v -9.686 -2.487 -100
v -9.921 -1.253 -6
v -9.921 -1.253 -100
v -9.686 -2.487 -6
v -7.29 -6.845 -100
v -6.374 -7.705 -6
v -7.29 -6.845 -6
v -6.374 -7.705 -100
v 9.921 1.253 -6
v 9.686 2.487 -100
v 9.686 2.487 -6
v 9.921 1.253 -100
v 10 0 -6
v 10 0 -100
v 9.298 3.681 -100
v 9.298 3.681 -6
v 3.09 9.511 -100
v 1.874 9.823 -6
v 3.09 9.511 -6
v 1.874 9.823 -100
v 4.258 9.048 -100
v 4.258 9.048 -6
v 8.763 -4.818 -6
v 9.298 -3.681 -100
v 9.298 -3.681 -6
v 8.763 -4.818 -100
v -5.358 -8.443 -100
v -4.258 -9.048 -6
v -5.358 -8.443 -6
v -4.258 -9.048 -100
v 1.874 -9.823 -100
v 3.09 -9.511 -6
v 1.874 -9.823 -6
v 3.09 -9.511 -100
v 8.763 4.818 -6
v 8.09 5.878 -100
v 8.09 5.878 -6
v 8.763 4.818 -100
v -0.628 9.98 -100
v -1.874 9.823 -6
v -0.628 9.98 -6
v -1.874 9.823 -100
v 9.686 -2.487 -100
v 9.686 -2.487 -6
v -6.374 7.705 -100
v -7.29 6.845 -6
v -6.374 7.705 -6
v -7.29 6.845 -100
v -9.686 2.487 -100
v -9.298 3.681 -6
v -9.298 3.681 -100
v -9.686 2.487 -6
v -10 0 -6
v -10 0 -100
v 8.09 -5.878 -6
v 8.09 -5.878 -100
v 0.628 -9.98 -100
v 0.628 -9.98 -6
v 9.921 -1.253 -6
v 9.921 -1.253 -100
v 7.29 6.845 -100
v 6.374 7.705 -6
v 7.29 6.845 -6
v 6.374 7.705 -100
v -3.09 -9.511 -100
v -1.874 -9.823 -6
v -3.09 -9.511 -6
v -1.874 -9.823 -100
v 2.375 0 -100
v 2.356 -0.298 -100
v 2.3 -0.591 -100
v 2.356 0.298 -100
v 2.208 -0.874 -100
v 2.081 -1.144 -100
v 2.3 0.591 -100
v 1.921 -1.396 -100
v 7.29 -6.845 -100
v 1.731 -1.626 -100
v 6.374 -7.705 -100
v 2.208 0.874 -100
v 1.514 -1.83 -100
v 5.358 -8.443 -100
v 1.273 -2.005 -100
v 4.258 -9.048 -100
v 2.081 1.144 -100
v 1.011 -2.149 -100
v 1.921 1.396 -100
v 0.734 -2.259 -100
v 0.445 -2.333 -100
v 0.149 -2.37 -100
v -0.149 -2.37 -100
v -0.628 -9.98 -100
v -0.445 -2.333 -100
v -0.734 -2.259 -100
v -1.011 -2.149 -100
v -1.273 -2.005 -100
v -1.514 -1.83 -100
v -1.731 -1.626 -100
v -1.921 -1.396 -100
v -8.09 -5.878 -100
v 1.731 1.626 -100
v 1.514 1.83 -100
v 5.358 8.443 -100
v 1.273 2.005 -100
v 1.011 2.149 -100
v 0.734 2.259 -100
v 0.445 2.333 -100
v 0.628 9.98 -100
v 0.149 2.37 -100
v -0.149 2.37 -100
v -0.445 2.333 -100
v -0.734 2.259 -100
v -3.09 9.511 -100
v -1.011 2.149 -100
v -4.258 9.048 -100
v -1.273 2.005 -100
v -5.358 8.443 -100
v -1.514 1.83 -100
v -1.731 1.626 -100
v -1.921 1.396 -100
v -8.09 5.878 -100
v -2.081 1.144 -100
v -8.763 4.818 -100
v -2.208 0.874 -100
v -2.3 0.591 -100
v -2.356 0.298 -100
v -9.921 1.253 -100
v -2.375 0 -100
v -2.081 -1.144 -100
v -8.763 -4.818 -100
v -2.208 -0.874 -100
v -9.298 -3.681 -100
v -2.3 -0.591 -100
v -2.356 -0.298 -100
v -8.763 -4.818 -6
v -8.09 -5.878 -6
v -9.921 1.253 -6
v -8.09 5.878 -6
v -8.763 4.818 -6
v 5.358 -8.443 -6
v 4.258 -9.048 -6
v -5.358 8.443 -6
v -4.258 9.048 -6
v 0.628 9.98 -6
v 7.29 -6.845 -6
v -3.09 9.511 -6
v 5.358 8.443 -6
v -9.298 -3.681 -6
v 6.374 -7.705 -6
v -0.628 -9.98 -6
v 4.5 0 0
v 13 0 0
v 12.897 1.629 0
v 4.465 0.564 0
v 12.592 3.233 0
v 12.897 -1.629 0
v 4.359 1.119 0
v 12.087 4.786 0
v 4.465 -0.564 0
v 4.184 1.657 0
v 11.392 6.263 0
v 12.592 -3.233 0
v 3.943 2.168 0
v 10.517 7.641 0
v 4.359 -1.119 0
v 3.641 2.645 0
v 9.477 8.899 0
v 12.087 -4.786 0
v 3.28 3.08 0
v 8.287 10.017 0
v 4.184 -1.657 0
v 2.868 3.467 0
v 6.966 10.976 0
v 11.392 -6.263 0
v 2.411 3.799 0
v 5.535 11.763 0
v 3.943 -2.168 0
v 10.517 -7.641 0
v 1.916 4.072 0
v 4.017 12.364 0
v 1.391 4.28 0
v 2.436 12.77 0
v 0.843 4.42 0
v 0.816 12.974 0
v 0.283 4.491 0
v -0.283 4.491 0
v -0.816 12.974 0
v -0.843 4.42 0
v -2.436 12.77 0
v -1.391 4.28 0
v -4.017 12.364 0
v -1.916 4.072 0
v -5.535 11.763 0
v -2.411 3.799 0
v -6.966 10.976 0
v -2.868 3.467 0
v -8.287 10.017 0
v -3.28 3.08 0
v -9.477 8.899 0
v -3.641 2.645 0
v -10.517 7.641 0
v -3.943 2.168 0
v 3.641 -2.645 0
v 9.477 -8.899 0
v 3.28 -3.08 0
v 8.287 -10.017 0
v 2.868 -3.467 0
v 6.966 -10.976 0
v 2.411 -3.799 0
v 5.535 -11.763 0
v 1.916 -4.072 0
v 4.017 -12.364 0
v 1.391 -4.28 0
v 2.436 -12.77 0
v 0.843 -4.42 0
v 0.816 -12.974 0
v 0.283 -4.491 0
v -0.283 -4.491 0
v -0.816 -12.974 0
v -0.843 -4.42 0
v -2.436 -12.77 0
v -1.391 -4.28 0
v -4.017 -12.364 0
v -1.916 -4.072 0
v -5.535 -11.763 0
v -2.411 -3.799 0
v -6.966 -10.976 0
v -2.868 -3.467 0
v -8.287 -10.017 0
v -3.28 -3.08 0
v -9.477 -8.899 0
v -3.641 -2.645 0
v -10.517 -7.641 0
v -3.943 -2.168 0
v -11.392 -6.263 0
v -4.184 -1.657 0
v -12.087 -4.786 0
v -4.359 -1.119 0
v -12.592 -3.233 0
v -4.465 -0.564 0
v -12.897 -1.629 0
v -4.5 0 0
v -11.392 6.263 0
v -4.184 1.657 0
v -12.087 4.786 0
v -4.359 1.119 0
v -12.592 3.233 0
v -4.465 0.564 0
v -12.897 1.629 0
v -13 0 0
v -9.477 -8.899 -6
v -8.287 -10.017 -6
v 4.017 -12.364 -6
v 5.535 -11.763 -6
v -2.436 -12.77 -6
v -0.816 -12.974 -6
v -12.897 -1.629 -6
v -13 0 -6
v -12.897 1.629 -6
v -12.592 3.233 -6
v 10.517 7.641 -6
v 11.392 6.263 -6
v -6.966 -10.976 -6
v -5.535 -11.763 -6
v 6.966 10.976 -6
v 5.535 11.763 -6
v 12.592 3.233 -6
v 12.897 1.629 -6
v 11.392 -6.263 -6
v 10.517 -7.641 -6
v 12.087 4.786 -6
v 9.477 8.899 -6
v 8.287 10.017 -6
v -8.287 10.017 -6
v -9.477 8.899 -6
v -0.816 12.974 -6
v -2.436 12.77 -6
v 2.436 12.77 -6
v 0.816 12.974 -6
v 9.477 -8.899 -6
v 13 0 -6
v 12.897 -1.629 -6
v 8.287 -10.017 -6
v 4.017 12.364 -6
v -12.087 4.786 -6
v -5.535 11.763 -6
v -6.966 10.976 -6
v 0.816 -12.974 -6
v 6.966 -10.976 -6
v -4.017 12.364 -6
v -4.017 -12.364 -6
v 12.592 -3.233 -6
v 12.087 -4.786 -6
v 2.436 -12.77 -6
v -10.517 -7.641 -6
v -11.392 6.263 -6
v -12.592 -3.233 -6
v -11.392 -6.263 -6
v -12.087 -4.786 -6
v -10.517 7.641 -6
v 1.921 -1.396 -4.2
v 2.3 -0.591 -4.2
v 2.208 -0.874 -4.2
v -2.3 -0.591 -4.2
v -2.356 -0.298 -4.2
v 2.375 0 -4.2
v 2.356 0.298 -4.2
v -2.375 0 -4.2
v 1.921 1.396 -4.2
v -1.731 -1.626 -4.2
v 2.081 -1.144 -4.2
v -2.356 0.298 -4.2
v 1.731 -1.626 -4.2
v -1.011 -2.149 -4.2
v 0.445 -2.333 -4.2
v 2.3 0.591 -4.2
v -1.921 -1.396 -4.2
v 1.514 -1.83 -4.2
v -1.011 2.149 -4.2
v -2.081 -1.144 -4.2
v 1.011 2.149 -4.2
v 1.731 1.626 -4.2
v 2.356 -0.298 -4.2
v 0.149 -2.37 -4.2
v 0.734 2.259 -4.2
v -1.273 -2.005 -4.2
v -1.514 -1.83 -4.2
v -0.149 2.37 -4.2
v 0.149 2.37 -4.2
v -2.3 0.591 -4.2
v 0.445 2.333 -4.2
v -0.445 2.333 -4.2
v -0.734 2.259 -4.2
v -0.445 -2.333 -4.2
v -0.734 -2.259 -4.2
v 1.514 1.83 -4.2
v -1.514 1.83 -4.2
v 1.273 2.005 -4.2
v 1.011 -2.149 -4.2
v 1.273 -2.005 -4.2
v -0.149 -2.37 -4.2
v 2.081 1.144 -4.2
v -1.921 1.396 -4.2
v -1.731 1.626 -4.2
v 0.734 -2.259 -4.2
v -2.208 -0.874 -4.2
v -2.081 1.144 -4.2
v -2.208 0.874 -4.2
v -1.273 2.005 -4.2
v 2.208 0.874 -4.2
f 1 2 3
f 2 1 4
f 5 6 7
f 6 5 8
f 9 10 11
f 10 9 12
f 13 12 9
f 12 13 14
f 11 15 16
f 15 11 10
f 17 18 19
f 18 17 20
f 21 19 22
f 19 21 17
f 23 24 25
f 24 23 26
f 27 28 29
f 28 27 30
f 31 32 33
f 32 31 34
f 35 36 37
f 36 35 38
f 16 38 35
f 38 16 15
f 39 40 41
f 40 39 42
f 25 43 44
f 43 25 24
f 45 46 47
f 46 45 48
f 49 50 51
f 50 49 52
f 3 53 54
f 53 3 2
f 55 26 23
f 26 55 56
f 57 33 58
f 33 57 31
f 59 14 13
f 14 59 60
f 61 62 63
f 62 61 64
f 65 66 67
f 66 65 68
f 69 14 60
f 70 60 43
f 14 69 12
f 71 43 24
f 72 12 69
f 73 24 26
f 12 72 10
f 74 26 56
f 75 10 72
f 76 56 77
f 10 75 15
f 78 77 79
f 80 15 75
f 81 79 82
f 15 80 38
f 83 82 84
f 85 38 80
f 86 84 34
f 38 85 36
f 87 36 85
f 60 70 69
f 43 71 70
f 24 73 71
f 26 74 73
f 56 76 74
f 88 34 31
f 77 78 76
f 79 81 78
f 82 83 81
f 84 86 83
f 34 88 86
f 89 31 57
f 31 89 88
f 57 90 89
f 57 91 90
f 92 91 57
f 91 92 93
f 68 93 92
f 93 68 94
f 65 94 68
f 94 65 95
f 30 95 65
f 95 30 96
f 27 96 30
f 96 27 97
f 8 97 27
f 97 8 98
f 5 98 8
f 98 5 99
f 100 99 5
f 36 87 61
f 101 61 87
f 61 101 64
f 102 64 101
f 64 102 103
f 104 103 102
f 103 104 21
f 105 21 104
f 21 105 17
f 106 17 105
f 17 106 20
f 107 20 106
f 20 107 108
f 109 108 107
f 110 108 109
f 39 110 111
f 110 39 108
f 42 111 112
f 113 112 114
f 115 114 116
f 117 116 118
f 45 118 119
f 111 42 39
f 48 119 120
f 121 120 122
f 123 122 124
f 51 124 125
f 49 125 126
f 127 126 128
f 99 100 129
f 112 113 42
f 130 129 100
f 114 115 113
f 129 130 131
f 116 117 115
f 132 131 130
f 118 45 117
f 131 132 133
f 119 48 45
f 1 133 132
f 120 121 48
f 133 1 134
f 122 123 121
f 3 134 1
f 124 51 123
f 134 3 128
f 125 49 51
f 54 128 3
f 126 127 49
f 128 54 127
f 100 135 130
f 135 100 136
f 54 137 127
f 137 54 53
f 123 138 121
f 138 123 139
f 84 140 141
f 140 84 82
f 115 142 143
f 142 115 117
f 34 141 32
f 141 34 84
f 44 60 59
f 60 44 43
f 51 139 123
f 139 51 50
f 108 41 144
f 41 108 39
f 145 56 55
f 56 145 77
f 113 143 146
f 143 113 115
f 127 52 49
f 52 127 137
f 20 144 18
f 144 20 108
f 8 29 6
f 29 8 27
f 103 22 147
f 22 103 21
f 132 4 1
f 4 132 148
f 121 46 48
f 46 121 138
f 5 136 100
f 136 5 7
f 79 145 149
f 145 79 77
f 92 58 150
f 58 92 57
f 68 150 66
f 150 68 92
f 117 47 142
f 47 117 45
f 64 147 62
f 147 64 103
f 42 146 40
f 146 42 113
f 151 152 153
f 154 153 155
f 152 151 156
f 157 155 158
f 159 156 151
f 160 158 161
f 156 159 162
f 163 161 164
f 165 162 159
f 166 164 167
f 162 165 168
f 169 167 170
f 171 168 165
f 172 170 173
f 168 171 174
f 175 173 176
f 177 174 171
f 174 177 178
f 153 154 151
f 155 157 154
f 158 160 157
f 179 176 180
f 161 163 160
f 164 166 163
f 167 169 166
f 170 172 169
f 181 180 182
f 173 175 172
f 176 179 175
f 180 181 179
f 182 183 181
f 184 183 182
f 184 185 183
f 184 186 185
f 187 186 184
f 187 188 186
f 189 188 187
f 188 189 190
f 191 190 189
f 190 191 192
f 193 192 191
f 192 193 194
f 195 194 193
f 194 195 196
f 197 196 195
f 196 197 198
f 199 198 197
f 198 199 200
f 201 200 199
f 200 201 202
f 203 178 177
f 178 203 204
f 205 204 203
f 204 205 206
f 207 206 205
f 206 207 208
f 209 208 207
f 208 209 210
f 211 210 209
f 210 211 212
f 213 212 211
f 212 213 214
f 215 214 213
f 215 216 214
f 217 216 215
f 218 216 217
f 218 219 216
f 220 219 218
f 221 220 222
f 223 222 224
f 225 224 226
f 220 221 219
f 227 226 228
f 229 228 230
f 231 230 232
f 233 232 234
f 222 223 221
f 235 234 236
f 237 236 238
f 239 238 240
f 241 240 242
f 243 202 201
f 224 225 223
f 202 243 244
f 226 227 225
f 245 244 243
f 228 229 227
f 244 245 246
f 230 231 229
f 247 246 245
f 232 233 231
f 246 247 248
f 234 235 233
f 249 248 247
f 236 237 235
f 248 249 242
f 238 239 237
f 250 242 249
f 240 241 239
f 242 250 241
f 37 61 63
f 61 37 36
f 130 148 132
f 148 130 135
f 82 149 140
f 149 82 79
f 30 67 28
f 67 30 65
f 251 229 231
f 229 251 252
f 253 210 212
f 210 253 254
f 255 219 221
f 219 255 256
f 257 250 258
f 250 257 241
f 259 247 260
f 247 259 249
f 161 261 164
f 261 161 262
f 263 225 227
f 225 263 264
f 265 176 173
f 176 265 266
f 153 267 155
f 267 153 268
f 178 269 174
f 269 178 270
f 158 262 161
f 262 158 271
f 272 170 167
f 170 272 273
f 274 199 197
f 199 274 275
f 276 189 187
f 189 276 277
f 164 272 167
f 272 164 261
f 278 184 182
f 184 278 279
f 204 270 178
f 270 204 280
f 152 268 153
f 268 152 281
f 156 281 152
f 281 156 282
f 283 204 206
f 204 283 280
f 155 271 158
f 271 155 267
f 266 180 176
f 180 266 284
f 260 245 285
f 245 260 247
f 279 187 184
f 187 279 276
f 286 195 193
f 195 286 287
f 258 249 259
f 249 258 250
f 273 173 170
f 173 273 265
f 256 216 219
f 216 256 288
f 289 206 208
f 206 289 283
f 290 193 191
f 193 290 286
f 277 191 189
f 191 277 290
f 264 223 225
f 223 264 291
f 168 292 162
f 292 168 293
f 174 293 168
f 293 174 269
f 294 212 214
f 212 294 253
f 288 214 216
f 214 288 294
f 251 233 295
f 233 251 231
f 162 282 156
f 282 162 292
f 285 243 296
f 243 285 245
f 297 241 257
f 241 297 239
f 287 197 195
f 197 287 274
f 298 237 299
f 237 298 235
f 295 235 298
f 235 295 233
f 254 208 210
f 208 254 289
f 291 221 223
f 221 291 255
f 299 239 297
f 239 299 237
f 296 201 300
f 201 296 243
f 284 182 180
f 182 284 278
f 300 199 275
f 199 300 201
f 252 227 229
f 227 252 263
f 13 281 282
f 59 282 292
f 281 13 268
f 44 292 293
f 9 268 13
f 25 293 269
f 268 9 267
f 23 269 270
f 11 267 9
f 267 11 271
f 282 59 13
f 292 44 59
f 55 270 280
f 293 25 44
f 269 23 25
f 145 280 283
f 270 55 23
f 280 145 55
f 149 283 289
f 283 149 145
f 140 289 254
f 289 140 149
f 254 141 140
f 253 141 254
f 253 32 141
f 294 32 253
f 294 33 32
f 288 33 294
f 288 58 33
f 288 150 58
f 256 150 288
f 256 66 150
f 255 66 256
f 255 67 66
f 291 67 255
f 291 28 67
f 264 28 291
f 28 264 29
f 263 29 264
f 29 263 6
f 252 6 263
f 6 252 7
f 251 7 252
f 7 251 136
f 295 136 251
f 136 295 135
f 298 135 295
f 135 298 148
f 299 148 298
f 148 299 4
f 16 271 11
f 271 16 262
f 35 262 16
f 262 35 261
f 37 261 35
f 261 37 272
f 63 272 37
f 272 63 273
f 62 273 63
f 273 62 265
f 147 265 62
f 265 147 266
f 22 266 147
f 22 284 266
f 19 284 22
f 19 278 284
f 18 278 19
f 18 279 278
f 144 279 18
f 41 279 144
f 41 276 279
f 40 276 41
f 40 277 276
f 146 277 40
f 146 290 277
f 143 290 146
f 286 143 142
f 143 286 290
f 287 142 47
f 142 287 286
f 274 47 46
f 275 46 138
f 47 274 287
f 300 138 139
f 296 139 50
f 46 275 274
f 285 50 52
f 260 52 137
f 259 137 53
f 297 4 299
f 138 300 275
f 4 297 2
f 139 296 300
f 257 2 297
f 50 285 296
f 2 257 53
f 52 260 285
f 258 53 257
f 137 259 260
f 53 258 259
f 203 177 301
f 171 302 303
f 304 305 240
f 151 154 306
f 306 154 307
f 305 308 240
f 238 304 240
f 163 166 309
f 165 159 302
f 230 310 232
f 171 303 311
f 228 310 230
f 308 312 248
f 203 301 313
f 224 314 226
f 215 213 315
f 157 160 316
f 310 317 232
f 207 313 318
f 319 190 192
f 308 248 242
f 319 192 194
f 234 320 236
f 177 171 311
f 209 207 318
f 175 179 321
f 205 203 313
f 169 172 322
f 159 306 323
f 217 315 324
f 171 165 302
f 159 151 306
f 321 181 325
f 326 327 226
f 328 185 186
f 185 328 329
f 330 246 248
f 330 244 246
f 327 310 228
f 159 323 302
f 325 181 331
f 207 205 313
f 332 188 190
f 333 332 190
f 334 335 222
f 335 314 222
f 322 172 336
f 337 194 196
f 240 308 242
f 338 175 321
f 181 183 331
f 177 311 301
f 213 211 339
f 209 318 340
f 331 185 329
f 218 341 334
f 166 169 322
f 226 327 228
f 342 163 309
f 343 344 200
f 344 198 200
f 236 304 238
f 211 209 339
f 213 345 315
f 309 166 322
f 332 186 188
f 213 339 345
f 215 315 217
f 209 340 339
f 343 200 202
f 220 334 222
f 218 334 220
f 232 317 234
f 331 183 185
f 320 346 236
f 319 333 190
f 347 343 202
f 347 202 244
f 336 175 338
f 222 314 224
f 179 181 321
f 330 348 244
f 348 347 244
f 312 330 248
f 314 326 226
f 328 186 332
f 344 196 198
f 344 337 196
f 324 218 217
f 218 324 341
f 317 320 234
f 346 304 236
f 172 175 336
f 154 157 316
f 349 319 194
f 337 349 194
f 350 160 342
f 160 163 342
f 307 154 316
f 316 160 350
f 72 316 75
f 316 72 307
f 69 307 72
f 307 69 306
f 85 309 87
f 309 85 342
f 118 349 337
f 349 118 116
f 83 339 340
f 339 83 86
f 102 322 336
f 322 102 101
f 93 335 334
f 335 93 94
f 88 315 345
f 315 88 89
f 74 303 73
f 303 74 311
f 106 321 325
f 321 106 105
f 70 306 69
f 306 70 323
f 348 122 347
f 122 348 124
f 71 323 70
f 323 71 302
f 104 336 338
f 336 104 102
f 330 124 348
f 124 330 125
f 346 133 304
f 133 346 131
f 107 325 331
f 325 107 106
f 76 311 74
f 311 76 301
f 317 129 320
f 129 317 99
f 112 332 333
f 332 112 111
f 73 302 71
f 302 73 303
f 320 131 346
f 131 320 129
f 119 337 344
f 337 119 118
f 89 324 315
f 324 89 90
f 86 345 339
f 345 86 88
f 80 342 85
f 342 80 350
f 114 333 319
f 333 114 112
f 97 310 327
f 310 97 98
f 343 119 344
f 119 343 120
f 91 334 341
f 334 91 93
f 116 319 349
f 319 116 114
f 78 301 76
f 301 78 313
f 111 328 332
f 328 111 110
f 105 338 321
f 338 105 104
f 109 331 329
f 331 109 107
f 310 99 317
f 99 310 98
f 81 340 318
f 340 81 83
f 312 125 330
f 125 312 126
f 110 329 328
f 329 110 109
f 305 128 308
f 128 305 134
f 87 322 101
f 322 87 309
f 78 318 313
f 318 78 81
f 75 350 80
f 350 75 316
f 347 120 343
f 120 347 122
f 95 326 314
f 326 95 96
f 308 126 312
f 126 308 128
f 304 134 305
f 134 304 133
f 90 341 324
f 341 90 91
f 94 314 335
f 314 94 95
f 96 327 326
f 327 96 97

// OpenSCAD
$fn = 50;


difference() {
	union() {
		translate(v = [0, 0, -100.0000000000]) {
			cylinder(h = 100, r = 10.0000000000);
		}
		translate(v = [0, 0, -6.0000000000]) {
			cylinder(h = 6, r = 13.0000000000);
		}
	}
	union() {
		translate(v = [0, 0, 0]) {
			rotate(a = [0, 0, 0]) {
				difference() {
					union() {
						#translate(v = [0, 0, -100.0000000000]) {
							cylinder(h = 100, r = 2.2500000000);
						}
						#translate(v = [0, 0, -4.2000000000]) {
							cylinder(h = 4.2000000000, r = 10.0000000000, r1 = 2.3750000000, r2 = 4.5000000000);
						}
						#translate(v = [0, 0, -100.0000000000]) {
							cylinder(h = 100, r = 2.3750000000);
						}
						#translate(v = [0, 0, -100.0000000000]) {
							cylinder(h = 100, r = 2.2500000000);
						}
					}
					union();
				}
			}
		}
	}
}
